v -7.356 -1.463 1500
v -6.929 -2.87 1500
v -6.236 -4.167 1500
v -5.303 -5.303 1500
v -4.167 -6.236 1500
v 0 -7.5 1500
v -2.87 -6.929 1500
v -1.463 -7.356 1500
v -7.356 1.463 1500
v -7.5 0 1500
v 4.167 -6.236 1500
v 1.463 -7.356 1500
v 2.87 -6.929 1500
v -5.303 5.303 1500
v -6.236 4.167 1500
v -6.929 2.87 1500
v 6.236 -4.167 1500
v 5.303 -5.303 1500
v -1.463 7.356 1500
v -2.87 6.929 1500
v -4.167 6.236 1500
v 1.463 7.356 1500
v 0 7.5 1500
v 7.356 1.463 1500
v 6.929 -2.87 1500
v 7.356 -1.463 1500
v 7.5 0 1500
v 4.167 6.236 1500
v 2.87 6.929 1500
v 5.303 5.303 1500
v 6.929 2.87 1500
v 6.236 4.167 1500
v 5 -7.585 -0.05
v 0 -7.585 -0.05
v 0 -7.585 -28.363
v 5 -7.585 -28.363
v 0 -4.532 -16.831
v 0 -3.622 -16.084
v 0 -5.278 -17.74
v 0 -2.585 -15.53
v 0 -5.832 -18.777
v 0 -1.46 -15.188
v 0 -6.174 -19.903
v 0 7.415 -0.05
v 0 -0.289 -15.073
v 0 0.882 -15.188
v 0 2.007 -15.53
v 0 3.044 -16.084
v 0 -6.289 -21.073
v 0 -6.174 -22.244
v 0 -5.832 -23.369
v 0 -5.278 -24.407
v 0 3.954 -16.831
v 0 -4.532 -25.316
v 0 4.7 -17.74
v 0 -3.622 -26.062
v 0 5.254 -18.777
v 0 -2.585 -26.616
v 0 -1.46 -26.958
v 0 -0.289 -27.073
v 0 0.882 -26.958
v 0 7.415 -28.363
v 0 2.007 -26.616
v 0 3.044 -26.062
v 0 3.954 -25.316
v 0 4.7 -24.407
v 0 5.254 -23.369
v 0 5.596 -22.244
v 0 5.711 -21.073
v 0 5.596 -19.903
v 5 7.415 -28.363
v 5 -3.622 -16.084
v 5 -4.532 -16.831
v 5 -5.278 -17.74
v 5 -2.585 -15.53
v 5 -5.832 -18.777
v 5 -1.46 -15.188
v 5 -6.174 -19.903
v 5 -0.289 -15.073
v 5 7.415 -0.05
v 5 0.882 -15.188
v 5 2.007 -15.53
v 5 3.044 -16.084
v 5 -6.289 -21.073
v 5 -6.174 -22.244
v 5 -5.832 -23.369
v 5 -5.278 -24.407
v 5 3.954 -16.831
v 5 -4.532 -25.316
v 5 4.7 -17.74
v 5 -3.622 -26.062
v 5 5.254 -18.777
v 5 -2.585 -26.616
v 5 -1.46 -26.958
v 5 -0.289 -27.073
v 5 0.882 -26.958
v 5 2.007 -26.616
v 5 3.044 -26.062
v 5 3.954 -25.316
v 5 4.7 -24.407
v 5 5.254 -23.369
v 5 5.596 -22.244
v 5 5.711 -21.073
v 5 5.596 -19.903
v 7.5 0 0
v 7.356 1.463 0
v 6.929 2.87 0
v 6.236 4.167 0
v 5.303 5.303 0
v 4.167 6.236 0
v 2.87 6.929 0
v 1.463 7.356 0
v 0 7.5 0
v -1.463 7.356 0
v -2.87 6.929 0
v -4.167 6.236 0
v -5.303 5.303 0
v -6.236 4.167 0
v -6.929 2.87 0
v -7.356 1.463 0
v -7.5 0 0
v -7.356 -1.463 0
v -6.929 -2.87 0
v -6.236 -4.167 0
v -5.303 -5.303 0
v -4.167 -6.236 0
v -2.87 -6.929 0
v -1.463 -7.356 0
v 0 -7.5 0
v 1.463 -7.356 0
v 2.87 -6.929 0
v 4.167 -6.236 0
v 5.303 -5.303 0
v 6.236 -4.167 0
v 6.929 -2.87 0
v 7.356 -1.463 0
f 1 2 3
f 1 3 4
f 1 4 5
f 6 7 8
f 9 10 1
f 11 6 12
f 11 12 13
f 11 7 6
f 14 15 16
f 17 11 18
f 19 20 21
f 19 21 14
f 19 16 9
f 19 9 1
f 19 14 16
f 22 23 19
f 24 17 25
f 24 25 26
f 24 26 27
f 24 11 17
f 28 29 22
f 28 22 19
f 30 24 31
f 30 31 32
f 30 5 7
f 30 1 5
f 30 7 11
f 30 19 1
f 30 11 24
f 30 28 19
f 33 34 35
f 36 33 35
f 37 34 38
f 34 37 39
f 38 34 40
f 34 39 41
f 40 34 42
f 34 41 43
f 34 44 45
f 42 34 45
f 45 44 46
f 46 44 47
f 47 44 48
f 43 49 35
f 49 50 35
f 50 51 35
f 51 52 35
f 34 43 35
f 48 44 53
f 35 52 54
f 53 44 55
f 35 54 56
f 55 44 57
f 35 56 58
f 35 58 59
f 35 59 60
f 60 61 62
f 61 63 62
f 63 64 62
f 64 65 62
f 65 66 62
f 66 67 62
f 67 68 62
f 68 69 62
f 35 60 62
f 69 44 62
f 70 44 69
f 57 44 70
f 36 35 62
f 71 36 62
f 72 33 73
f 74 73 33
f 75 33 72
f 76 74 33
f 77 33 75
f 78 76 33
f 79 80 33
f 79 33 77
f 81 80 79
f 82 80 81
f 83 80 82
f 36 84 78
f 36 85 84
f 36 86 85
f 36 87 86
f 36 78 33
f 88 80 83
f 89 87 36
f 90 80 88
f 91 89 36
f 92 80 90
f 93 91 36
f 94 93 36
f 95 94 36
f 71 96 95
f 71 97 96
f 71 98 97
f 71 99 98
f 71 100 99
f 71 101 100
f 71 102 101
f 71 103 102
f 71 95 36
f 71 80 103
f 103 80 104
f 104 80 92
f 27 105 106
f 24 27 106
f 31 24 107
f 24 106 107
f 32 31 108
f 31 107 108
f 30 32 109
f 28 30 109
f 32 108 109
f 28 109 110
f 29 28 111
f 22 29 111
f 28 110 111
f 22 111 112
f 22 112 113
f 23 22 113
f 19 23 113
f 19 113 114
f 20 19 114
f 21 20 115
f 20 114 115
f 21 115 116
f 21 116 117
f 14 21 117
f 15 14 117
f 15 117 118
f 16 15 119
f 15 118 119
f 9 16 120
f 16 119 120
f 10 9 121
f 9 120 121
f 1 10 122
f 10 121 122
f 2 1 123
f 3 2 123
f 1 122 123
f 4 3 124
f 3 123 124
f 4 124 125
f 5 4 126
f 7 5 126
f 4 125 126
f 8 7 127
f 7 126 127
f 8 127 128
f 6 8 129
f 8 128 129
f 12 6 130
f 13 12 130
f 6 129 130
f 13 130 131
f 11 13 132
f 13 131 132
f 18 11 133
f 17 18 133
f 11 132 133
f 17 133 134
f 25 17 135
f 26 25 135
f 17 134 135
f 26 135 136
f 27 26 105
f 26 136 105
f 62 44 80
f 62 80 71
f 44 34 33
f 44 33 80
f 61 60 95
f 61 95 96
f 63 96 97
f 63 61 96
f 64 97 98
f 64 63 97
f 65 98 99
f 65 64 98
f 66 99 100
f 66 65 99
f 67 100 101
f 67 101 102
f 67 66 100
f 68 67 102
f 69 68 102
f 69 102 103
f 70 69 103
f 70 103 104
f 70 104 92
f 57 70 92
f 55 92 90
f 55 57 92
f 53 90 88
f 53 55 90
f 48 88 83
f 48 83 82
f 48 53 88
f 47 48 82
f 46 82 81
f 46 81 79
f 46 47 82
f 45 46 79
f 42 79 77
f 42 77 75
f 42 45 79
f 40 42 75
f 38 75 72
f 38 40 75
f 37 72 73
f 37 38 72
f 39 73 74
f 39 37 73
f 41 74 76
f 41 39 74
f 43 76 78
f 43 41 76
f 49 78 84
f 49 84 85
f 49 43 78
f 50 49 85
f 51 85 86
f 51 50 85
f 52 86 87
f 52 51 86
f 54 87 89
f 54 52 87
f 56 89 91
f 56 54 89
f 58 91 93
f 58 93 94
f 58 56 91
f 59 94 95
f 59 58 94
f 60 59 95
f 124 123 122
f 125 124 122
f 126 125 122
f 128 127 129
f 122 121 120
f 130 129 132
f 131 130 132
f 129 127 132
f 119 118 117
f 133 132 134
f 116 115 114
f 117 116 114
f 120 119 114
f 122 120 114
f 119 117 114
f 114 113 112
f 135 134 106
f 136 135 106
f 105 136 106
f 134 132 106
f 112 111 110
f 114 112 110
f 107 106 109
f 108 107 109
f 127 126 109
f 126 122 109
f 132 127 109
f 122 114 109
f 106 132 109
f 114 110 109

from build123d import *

# Parameters (mm, degrees)
SKETCH1_R           = 7.5
BOSS_EXTRUDE1_DEPTH = 1500
SKETCH4_W           = 28.313178599
SKETCH4_H           = 15
SKETCH4_R           = 6
BOSS_EXTRUDE3_DEPTH = 5


with BuildPart() as part:
    # Sketch1 → Boss-Extrude1 (new body)
    with BuildSketch(Plane.XY):
        Circle(SKETCH1_R)
    extrude(amount=BOSS_EXTRUDE1_DEPTH)


with BuildPart() as body_2:
    # Sketch4 → Boss-Extrude3 (new body)
    with BuildSketch(Plane(origin=(0, 0, 0), x_dir=(0, 0, -1), z_dir=(1, 0, 0))):
        with Locations((14.206629316, -0.084992358)):
            Rectangle(SKETCH4_W, SKETCH4_H)
        with Locations((21.073208184, -0.289020276)):
            Circle(SKETCH4_R, mode=Mode.SUBTRACT)
    extrude(amount=BOSS_EXTRUDE3_DEPTH)


solid = Compound([part.part, body_2.part])
